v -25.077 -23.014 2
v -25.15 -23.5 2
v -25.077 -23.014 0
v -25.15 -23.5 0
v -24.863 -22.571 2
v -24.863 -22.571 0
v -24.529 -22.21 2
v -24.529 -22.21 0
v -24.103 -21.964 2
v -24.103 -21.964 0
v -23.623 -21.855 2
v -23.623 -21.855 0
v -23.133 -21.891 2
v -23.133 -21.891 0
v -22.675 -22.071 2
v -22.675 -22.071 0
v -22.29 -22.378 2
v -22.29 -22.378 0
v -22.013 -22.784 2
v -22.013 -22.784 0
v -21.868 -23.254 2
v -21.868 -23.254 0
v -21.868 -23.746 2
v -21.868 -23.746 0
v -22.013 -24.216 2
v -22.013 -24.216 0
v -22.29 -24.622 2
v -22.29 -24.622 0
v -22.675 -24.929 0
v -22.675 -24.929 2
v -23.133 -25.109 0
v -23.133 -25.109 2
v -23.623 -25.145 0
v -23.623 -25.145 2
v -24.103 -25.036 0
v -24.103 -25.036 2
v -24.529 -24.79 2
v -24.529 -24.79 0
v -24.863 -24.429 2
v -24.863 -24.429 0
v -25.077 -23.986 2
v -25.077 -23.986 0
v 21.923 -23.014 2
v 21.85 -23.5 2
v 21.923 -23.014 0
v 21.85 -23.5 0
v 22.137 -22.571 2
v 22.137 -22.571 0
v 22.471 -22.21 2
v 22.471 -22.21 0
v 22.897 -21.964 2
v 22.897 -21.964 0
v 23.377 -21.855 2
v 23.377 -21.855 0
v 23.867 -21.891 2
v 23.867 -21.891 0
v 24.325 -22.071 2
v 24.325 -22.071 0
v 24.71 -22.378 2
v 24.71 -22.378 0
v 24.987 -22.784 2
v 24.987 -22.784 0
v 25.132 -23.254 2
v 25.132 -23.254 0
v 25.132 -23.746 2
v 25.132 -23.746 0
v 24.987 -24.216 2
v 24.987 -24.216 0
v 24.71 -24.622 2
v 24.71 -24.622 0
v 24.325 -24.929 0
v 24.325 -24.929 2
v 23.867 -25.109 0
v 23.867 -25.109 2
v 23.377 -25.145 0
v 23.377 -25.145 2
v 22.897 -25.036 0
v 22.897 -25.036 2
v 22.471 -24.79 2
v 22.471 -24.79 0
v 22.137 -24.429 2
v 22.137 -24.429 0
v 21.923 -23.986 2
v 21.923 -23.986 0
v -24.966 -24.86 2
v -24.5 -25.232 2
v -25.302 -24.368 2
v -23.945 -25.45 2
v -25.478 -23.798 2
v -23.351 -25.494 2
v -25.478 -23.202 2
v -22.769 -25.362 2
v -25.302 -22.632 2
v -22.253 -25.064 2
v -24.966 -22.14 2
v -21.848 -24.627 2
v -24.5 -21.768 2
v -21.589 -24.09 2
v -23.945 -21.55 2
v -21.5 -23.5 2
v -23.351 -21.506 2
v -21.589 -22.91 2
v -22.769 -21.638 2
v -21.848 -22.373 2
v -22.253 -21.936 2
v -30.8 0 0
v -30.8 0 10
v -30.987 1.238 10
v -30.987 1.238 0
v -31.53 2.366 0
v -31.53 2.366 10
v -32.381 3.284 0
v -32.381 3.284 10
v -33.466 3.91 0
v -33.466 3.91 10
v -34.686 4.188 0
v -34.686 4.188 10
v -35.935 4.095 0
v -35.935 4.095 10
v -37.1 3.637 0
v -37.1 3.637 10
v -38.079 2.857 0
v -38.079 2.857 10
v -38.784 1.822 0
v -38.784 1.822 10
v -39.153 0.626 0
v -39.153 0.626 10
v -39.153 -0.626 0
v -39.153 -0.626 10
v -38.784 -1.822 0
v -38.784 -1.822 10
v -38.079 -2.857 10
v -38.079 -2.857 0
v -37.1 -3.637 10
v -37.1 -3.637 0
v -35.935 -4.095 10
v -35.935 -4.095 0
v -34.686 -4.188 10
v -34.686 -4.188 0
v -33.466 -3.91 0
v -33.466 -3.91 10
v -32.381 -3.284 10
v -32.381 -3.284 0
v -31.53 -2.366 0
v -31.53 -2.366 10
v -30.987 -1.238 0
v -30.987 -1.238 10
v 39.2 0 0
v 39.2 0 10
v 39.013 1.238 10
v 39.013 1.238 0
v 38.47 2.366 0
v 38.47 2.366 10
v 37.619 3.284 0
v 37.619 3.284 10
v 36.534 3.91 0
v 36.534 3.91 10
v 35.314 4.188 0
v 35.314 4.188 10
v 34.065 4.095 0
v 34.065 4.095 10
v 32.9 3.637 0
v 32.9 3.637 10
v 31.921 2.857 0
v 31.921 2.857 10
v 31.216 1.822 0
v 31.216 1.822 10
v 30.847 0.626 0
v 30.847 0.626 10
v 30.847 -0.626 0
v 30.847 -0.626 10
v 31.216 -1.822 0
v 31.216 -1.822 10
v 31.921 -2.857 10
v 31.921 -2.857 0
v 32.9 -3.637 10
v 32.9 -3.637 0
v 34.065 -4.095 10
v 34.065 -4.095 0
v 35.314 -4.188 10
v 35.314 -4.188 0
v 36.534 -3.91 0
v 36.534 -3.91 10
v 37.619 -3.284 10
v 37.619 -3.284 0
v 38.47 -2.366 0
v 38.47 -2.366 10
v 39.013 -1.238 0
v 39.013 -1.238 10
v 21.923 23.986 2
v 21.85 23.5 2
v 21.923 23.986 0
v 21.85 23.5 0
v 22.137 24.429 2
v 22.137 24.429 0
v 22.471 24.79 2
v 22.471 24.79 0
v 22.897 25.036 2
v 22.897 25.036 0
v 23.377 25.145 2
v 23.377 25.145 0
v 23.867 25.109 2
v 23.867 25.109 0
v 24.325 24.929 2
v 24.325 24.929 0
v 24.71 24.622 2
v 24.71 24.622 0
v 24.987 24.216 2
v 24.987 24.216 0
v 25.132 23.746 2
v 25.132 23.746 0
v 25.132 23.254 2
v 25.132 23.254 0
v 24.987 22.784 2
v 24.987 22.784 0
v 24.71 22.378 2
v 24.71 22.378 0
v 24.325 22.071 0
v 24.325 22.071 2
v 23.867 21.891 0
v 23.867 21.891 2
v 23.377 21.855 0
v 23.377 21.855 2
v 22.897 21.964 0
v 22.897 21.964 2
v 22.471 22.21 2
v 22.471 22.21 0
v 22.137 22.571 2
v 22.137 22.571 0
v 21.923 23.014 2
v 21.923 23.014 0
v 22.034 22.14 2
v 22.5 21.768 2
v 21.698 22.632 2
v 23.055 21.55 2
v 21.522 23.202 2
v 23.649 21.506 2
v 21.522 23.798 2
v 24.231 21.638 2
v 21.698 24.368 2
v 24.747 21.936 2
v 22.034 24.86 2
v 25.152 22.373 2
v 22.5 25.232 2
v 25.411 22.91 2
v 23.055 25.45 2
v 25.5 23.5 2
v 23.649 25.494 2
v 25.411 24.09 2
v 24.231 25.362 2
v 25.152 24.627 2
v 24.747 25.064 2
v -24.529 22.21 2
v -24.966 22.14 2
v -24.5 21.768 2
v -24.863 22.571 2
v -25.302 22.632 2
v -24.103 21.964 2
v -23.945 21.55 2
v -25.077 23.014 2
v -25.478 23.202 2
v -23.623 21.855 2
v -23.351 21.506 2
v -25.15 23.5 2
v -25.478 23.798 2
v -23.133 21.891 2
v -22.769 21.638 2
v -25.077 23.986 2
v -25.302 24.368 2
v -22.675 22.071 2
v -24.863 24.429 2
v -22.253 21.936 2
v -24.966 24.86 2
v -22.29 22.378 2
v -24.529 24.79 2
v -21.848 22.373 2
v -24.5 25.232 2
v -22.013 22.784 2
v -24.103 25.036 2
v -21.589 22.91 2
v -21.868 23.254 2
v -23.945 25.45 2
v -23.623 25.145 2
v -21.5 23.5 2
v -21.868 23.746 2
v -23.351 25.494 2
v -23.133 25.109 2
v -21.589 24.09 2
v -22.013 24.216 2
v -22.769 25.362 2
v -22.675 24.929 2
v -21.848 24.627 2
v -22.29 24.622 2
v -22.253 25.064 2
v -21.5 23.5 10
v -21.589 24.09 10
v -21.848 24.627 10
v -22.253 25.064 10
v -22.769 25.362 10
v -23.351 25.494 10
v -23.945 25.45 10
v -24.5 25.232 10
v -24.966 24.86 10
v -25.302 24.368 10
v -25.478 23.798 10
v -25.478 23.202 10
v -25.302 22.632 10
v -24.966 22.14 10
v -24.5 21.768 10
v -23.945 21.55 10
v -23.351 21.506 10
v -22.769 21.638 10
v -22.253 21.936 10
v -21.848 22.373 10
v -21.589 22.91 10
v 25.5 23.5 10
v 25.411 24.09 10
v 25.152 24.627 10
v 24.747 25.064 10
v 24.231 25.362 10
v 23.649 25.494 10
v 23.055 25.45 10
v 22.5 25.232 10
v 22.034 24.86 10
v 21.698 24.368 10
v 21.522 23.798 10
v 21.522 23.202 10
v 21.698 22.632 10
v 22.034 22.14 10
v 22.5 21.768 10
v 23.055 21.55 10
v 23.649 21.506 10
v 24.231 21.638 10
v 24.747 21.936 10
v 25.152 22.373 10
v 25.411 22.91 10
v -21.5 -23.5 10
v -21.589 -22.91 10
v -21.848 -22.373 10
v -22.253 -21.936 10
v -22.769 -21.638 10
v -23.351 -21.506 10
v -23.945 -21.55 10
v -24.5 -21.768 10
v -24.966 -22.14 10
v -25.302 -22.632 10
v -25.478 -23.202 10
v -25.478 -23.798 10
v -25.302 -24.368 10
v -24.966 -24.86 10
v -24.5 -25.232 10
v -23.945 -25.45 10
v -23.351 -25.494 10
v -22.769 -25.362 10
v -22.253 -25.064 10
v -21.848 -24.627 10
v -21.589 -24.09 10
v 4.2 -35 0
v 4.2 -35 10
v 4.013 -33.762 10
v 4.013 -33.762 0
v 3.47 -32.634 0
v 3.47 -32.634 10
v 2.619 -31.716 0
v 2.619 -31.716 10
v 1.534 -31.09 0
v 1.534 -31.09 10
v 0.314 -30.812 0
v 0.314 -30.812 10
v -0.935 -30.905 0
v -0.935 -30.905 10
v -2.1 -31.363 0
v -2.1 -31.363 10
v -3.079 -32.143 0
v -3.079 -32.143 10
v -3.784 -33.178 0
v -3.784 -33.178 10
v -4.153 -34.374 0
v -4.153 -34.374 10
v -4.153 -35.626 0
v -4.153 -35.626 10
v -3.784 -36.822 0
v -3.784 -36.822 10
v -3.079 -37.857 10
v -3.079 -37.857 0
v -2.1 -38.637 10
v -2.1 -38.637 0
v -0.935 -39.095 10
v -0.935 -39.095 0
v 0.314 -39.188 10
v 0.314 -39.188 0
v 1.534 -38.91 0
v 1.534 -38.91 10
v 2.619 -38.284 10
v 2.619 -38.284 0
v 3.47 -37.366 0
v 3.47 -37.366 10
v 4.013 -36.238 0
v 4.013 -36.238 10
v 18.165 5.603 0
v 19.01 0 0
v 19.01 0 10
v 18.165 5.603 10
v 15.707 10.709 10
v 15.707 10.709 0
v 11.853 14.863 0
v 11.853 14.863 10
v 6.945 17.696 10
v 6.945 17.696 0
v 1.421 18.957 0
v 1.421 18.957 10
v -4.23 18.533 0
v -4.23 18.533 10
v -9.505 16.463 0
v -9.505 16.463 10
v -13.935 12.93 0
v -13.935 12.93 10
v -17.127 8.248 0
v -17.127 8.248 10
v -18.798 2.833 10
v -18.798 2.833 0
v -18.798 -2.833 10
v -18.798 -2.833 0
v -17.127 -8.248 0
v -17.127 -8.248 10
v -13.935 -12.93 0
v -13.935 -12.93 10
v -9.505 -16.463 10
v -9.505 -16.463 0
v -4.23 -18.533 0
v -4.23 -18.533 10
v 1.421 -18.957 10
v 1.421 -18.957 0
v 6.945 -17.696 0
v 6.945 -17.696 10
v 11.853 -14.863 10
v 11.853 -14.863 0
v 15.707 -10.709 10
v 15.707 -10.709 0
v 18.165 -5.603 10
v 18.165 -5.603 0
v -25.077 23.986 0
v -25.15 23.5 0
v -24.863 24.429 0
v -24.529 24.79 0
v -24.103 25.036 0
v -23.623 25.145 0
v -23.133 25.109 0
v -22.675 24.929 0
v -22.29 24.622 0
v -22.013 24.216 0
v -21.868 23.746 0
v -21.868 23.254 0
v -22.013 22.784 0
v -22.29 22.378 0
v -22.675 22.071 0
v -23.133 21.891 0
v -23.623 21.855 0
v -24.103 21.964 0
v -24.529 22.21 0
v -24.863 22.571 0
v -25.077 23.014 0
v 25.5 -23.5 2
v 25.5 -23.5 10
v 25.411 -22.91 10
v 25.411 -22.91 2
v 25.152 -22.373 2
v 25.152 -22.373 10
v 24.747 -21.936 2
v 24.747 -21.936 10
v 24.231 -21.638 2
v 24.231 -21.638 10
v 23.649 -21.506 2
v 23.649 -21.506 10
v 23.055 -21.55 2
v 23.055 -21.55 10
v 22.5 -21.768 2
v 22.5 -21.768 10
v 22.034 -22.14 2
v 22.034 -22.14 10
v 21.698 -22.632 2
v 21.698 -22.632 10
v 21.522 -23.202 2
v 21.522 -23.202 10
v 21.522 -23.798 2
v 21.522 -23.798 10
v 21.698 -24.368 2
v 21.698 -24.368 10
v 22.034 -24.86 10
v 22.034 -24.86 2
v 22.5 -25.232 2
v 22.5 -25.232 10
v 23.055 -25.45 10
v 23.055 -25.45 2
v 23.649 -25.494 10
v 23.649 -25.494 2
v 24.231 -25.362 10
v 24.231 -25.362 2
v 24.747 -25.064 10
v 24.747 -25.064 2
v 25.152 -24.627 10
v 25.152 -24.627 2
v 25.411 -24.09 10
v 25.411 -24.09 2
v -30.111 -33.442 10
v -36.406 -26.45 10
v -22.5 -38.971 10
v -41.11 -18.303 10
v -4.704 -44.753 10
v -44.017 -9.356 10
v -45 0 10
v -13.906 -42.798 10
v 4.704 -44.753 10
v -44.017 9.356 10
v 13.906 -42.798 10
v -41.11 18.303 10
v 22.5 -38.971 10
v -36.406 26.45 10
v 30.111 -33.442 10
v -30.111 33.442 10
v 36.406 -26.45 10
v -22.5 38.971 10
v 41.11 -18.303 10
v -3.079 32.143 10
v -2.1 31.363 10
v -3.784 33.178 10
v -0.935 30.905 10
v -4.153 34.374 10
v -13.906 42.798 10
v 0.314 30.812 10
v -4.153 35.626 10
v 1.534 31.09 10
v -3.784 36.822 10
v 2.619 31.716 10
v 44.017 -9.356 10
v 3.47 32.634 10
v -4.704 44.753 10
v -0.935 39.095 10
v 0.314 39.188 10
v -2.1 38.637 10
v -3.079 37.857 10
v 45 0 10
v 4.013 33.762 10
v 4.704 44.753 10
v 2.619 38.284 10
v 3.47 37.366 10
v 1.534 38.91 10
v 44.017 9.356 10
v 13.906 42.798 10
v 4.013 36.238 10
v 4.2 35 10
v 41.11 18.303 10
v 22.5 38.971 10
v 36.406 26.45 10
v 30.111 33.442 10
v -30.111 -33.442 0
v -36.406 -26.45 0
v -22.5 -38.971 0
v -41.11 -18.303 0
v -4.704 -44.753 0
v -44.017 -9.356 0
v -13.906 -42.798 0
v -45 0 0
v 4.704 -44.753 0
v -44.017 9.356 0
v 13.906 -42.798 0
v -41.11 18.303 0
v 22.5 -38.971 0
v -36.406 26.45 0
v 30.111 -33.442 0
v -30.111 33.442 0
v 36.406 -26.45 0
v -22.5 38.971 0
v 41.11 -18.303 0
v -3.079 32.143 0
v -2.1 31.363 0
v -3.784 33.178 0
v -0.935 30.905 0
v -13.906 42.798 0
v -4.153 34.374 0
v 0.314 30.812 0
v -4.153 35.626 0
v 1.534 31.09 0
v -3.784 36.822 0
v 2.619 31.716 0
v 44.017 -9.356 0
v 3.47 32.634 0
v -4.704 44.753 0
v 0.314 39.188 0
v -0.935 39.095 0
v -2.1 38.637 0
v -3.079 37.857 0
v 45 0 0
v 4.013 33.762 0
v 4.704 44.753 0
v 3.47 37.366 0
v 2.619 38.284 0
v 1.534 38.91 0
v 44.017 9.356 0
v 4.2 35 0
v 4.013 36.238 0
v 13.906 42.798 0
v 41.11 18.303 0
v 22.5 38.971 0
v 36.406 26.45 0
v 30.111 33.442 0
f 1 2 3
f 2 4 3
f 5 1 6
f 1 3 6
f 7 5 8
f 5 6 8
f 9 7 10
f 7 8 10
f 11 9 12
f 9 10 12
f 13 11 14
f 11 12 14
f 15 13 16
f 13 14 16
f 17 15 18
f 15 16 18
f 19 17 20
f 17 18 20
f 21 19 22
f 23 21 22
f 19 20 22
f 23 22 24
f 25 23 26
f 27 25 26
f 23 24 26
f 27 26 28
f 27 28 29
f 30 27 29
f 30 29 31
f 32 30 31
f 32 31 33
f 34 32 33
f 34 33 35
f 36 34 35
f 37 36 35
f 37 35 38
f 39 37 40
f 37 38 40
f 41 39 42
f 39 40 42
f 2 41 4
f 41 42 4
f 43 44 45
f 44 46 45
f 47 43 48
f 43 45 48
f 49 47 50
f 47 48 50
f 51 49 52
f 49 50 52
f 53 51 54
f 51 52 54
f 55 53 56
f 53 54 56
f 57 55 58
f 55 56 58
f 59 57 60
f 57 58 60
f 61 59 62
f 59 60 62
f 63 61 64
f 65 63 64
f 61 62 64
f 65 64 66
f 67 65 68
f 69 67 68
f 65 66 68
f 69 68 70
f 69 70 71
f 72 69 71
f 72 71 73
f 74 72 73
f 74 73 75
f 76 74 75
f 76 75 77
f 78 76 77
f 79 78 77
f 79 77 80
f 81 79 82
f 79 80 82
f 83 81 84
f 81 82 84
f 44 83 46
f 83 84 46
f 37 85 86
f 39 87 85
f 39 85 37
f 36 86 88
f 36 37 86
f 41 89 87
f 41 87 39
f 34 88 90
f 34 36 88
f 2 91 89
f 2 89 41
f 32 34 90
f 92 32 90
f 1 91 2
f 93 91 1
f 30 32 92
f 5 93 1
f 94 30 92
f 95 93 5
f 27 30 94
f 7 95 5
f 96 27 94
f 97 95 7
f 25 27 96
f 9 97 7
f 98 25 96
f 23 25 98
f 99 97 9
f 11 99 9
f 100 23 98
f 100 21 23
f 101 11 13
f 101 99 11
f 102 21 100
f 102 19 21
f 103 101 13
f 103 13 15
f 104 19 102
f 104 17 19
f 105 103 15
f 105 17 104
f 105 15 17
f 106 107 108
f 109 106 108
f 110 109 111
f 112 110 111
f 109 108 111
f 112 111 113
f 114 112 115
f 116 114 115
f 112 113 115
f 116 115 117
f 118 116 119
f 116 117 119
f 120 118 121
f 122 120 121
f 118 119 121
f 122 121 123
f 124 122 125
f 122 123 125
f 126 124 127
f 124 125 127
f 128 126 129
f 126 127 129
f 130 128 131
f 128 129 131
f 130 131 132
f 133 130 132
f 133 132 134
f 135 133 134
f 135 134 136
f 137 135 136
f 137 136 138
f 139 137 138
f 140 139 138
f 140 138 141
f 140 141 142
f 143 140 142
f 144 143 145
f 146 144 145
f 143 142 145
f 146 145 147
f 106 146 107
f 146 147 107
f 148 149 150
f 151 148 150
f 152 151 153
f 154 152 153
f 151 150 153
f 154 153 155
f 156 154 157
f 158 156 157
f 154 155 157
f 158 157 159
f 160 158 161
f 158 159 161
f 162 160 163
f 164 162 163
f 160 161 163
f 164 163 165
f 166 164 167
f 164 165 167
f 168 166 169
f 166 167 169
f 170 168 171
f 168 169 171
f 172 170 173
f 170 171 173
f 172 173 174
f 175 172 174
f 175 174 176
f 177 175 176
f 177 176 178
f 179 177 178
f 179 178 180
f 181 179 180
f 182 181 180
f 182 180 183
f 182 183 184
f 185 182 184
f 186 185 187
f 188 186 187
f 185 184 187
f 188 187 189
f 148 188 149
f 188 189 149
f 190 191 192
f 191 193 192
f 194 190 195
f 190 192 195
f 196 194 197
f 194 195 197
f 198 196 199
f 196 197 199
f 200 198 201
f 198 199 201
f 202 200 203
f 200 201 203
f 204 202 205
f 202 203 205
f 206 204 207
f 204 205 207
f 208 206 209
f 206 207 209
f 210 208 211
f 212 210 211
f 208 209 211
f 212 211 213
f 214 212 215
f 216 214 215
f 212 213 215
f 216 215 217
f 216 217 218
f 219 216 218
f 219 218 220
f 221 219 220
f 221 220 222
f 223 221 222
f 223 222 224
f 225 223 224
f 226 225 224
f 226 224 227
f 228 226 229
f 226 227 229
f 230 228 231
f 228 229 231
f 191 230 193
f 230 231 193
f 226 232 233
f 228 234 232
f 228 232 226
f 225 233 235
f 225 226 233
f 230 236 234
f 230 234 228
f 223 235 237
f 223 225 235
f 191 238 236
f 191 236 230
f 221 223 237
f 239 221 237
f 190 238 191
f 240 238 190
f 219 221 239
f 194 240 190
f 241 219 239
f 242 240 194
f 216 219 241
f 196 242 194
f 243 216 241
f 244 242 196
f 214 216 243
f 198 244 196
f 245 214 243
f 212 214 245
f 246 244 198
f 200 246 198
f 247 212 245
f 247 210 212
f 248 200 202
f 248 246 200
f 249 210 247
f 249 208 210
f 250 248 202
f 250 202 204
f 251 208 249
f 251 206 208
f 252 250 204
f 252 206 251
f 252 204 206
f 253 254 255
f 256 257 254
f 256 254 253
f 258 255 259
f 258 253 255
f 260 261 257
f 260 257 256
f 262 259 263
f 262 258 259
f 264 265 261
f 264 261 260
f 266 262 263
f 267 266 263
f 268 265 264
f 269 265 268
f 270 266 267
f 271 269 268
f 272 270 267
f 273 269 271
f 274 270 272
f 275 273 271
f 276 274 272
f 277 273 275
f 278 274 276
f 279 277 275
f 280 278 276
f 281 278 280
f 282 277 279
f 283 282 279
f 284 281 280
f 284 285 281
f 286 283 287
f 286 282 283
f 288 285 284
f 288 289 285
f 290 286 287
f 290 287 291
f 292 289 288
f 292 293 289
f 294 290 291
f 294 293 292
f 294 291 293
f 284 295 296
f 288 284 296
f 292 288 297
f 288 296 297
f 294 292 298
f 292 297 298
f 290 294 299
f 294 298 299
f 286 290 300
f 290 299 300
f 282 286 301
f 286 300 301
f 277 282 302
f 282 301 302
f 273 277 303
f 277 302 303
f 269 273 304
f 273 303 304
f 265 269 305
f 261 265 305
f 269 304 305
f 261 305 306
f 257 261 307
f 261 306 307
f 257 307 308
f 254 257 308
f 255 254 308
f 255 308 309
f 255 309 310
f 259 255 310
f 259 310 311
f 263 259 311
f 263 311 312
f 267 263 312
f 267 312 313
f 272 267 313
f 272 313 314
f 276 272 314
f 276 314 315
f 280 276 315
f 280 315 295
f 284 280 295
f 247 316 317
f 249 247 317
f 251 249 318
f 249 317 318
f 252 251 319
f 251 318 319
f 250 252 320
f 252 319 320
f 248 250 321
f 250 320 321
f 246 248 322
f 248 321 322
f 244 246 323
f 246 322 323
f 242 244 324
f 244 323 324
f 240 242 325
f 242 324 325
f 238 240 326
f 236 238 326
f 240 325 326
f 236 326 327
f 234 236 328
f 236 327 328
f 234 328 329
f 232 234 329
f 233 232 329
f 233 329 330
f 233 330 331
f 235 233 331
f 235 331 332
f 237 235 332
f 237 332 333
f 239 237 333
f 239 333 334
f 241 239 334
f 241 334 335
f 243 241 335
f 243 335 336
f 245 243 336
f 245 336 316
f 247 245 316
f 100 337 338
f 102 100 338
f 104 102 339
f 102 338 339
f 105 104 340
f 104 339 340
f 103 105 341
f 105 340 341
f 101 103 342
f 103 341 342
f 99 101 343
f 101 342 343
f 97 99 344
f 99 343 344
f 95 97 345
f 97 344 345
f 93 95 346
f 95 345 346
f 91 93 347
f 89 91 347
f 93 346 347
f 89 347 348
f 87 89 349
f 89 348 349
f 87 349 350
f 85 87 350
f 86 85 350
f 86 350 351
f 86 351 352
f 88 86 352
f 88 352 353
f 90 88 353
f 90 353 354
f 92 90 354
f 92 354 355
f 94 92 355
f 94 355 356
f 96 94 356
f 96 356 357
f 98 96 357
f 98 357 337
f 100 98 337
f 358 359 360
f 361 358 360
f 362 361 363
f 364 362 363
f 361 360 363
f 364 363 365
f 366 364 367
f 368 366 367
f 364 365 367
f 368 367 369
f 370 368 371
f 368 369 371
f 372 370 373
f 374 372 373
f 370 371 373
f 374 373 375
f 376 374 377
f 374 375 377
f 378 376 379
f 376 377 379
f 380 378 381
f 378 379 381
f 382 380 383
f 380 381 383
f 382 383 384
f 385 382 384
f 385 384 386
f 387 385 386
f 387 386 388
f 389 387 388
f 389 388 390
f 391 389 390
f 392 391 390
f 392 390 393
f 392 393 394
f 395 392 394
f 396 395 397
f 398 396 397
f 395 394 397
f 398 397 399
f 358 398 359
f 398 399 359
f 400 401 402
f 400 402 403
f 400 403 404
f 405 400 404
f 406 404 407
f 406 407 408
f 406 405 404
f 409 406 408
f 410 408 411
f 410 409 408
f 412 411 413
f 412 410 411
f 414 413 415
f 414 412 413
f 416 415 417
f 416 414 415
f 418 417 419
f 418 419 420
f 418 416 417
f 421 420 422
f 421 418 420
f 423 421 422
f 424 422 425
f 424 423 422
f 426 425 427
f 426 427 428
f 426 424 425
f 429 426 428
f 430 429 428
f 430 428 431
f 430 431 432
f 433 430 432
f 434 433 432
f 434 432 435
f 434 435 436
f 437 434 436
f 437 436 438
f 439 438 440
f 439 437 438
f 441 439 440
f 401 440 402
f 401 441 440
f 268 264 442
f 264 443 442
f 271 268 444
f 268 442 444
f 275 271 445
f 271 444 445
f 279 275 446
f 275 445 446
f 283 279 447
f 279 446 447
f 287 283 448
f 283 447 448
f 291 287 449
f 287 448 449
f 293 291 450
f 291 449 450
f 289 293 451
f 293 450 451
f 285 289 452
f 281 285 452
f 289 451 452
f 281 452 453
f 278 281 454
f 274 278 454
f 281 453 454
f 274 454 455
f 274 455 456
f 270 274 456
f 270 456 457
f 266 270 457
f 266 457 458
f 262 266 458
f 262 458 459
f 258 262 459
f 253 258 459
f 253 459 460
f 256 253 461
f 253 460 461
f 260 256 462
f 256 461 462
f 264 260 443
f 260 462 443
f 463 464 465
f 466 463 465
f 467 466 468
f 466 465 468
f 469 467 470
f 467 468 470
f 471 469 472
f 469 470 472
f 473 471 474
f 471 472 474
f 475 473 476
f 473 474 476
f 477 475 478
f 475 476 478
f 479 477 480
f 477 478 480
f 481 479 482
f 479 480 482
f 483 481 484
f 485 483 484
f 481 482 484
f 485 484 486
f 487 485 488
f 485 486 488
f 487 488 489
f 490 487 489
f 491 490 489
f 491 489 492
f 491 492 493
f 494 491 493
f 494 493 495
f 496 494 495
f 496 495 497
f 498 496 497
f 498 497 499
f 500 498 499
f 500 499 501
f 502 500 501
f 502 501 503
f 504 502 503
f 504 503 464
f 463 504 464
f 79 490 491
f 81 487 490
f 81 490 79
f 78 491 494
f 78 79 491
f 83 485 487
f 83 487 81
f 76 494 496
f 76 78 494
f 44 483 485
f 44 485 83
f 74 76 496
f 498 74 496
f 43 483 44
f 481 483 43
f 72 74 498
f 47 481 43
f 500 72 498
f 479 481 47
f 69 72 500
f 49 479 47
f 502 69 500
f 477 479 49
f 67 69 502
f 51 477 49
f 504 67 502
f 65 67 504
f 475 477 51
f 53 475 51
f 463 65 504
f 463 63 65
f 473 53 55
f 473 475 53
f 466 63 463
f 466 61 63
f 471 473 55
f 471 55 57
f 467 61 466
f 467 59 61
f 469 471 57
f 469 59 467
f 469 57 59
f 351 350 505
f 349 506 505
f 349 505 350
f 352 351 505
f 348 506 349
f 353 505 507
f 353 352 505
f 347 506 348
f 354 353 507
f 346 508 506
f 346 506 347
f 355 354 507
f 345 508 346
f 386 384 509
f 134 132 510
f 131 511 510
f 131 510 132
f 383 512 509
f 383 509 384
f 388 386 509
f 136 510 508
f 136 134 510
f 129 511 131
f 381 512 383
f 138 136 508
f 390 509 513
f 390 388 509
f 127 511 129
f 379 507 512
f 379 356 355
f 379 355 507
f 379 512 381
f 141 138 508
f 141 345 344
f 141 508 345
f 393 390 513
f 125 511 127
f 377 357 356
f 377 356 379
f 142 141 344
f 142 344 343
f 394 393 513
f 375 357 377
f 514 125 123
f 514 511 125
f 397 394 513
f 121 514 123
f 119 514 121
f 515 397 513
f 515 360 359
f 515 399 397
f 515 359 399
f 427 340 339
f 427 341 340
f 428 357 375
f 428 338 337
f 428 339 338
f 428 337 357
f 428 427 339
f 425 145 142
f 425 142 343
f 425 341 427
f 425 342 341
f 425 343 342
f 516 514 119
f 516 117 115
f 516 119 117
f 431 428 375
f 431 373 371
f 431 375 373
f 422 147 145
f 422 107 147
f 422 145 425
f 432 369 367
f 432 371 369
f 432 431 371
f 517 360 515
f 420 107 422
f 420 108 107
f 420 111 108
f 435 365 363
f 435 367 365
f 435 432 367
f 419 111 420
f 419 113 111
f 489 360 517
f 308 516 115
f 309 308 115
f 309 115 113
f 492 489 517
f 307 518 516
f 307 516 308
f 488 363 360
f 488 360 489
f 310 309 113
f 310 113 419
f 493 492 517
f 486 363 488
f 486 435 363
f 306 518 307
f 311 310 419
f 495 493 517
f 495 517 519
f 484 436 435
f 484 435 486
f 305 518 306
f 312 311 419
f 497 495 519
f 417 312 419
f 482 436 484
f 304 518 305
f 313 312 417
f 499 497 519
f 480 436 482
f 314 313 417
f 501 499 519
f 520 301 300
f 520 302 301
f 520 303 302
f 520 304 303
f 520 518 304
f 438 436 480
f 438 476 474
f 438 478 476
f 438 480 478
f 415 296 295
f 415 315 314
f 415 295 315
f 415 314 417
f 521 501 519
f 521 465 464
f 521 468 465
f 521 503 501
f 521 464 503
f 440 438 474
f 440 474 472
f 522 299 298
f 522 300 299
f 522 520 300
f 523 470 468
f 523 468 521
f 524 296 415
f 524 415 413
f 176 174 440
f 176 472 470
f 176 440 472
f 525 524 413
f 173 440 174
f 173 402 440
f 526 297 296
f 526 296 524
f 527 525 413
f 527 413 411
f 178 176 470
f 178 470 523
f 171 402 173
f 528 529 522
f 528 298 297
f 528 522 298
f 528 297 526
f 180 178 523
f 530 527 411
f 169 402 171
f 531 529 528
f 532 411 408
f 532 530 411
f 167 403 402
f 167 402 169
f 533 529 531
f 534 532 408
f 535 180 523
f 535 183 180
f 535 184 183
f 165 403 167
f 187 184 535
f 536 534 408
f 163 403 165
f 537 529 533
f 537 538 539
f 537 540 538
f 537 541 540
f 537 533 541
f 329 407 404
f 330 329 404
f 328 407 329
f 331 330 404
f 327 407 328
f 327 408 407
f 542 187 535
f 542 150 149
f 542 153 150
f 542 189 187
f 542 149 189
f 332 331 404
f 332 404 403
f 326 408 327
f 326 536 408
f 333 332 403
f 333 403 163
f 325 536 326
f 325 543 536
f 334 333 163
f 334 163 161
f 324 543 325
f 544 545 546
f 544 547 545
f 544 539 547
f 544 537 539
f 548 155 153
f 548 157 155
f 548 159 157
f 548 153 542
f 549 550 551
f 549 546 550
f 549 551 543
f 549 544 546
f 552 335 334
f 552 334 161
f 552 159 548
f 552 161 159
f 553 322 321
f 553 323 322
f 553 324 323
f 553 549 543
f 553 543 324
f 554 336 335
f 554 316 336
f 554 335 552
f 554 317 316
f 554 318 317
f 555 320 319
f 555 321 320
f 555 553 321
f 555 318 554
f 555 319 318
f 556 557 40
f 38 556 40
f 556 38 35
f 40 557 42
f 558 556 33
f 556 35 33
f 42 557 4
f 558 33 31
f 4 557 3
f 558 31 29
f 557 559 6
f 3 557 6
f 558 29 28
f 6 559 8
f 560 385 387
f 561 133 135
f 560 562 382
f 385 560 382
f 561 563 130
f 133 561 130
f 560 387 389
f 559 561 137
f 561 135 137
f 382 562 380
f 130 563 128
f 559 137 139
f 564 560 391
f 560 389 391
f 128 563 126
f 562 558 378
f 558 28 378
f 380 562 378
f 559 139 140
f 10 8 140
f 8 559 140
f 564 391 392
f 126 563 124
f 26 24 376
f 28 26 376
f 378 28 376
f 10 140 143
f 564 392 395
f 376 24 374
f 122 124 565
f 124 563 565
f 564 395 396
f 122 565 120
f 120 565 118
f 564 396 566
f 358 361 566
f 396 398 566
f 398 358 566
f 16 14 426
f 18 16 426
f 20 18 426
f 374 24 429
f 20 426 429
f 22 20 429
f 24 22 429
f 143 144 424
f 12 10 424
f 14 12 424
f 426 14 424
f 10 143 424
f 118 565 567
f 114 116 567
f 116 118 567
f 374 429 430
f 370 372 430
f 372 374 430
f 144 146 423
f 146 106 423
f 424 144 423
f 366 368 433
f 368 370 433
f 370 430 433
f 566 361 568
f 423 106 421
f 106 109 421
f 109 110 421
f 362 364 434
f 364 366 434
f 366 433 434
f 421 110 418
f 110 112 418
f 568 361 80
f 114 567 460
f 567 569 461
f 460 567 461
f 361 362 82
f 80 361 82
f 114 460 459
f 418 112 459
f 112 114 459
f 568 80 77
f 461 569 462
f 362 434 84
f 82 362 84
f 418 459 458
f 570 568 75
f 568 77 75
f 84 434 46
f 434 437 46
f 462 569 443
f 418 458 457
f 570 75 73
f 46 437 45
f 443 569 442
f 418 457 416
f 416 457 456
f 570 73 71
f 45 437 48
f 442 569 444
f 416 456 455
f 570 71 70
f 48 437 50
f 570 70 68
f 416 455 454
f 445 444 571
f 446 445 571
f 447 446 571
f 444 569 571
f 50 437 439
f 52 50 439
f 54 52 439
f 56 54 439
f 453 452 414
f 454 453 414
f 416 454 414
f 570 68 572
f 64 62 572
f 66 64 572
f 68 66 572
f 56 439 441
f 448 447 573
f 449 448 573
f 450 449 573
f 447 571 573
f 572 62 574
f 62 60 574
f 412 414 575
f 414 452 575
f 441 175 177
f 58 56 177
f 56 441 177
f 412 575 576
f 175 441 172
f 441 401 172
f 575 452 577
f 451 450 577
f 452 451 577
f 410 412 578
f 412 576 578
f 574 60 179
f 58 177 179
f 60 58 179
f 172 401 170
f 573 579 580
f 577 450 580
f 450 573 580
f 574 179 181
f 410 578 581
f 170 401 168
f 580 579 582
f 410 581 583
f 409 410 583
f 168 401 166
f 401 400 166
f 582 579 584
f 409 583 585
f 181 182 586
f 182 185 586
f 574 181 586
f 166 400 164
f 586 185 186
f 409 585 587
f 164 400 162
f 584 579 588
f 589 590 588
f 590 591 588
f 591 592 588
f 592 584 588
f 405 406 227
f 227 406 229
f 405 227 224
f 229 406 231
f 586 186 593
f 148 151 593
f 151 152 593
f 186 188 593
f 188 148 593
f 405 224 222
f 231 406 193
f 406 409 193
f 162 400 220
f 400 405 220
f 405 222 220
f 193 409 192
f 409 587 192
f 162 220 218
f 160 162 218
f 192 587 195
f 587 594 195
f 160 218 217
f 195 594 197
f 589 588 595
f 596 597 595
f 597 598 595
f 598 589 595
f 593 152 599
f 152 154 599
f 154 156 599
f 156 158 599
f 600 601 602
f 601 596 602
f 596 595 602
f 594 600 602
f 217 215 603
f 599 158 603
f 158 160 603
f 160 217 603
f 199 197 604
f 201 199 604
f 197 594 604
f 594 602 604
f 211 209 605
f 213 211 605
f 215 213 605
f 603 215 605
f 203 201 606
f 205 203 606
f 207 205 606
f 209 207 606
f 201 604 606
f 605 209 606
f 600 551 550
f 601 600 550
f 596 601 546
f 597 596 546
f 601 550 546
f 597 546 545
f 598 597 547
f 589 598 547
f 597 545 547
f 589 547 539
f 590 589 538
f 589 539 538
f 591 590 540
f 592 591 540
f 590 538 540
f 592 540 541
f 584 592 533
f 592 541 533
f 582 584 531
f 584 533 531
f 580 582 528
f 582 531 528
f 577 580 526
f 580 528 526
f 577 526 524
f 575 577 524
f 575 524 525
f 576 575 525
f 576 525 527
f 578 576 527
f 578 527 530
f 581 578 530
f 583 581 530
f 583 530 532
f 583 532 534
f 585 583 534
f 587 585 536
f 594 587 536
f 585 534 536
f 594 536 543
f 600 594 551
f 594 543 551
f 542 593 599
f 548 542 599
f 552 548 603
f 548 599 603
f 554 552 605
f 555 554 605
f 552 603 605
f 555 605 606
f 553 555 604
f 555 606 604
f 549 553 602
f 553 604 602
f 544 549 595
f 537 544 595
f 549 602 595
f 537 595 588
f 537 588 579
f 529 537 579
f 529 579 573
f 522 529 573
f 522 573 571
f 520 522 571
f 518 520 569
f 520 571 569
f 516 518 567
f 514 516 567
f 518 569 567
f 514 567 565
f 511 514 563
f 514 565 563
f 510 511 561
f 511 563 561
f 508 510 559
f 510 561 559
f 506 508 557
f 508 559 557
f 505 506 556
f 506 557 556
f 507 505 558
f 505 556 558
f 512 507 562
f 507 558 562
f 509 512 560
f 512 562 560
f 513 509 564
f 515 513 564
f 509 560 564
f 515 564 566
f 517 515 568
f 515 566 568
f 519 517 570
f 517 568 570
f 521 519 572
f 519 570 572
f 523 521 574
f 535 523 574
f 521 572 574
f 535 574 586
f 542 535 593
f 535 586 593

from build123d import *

# Parameters (mm, degrees)
SKETCH_1_R                   = 45
SKETCH_1_R_2                 = 19.01
EXTRUDE_1_DEPTH              = 10
HOLE_WIZARD_M4_1_D           = 3.3
HOLE_WIZARD_M4_1_DEPTH       = 10.1
HOLE_WIZARD_M4_1_CBORE_D     = 4
HOLE_WIZARD_M4_1_CBORE_DEPTH = 8
HOLE_WIZARD_M4_1_TIP         = 0.991420021
SKETCH_4_R                   = 4.2
CUT_EXTRUDE_1_DEPTH          = 10


with BuildPart() as part:
    # 草图1 → 拉伸1 (new body)
    with BuildSketch(Plane.XY):
        Circle(SKETCH_1_R)
        Circle(SKETCH_1_R_2, mode=Mode.SUBTRACT)
    extrude(amount=EXTRUDE_1_DEPTH)

    # M4 螺纹孔1
    with Locations(Plane(origin=(-23.5, 23.5, 10), x_dir=(1, 0, 0), z_dir=(0, 0, 1))):
        with Locations((0, 0), (47, 0), (47, -47), (0, -47)):
            CounterBoreHole(HOLE_WIZARD_M4_1_D / 2, HOLE_WIZARD_M4_1_CBORE_D / 2, HOLE_WIZARD_M4_1_CBORE_DEPTH, depth=HOLE_WIZARD_M4_1_DEPTH)
            with Locations((0, 0, -(HOLE_WIZARD_M4_1_DEPTH + HOLE_WIZARD_M4_1_TIP / 2))):  # 118° drill point
                Cone(0, HOLE_WIZARD_M4_1_D / 2, HOLE_WIZARD_M4_1_TIP, mode=Mode.SUBTRACT)

    # 草图4 → 切除-拉伸1 (cut)
    with BuildSketch(Plane.XY.offset(10)):
        with Locations((0, 35)):
            Circle(SKETCH_4_R)
        with Locations((-35, 0)):
            Circle(SKETCH_4_R)
        with Locations((0, -35)):
            Circle(SKETCH_4_R)
        with Locations((35, 0)):
            Circle(SKETCH_4_R)
    extrude(amount=-CUT_EXTRUDE_1_DEPTH, mode=Mode.SUBTRACT)


solid = part.part
